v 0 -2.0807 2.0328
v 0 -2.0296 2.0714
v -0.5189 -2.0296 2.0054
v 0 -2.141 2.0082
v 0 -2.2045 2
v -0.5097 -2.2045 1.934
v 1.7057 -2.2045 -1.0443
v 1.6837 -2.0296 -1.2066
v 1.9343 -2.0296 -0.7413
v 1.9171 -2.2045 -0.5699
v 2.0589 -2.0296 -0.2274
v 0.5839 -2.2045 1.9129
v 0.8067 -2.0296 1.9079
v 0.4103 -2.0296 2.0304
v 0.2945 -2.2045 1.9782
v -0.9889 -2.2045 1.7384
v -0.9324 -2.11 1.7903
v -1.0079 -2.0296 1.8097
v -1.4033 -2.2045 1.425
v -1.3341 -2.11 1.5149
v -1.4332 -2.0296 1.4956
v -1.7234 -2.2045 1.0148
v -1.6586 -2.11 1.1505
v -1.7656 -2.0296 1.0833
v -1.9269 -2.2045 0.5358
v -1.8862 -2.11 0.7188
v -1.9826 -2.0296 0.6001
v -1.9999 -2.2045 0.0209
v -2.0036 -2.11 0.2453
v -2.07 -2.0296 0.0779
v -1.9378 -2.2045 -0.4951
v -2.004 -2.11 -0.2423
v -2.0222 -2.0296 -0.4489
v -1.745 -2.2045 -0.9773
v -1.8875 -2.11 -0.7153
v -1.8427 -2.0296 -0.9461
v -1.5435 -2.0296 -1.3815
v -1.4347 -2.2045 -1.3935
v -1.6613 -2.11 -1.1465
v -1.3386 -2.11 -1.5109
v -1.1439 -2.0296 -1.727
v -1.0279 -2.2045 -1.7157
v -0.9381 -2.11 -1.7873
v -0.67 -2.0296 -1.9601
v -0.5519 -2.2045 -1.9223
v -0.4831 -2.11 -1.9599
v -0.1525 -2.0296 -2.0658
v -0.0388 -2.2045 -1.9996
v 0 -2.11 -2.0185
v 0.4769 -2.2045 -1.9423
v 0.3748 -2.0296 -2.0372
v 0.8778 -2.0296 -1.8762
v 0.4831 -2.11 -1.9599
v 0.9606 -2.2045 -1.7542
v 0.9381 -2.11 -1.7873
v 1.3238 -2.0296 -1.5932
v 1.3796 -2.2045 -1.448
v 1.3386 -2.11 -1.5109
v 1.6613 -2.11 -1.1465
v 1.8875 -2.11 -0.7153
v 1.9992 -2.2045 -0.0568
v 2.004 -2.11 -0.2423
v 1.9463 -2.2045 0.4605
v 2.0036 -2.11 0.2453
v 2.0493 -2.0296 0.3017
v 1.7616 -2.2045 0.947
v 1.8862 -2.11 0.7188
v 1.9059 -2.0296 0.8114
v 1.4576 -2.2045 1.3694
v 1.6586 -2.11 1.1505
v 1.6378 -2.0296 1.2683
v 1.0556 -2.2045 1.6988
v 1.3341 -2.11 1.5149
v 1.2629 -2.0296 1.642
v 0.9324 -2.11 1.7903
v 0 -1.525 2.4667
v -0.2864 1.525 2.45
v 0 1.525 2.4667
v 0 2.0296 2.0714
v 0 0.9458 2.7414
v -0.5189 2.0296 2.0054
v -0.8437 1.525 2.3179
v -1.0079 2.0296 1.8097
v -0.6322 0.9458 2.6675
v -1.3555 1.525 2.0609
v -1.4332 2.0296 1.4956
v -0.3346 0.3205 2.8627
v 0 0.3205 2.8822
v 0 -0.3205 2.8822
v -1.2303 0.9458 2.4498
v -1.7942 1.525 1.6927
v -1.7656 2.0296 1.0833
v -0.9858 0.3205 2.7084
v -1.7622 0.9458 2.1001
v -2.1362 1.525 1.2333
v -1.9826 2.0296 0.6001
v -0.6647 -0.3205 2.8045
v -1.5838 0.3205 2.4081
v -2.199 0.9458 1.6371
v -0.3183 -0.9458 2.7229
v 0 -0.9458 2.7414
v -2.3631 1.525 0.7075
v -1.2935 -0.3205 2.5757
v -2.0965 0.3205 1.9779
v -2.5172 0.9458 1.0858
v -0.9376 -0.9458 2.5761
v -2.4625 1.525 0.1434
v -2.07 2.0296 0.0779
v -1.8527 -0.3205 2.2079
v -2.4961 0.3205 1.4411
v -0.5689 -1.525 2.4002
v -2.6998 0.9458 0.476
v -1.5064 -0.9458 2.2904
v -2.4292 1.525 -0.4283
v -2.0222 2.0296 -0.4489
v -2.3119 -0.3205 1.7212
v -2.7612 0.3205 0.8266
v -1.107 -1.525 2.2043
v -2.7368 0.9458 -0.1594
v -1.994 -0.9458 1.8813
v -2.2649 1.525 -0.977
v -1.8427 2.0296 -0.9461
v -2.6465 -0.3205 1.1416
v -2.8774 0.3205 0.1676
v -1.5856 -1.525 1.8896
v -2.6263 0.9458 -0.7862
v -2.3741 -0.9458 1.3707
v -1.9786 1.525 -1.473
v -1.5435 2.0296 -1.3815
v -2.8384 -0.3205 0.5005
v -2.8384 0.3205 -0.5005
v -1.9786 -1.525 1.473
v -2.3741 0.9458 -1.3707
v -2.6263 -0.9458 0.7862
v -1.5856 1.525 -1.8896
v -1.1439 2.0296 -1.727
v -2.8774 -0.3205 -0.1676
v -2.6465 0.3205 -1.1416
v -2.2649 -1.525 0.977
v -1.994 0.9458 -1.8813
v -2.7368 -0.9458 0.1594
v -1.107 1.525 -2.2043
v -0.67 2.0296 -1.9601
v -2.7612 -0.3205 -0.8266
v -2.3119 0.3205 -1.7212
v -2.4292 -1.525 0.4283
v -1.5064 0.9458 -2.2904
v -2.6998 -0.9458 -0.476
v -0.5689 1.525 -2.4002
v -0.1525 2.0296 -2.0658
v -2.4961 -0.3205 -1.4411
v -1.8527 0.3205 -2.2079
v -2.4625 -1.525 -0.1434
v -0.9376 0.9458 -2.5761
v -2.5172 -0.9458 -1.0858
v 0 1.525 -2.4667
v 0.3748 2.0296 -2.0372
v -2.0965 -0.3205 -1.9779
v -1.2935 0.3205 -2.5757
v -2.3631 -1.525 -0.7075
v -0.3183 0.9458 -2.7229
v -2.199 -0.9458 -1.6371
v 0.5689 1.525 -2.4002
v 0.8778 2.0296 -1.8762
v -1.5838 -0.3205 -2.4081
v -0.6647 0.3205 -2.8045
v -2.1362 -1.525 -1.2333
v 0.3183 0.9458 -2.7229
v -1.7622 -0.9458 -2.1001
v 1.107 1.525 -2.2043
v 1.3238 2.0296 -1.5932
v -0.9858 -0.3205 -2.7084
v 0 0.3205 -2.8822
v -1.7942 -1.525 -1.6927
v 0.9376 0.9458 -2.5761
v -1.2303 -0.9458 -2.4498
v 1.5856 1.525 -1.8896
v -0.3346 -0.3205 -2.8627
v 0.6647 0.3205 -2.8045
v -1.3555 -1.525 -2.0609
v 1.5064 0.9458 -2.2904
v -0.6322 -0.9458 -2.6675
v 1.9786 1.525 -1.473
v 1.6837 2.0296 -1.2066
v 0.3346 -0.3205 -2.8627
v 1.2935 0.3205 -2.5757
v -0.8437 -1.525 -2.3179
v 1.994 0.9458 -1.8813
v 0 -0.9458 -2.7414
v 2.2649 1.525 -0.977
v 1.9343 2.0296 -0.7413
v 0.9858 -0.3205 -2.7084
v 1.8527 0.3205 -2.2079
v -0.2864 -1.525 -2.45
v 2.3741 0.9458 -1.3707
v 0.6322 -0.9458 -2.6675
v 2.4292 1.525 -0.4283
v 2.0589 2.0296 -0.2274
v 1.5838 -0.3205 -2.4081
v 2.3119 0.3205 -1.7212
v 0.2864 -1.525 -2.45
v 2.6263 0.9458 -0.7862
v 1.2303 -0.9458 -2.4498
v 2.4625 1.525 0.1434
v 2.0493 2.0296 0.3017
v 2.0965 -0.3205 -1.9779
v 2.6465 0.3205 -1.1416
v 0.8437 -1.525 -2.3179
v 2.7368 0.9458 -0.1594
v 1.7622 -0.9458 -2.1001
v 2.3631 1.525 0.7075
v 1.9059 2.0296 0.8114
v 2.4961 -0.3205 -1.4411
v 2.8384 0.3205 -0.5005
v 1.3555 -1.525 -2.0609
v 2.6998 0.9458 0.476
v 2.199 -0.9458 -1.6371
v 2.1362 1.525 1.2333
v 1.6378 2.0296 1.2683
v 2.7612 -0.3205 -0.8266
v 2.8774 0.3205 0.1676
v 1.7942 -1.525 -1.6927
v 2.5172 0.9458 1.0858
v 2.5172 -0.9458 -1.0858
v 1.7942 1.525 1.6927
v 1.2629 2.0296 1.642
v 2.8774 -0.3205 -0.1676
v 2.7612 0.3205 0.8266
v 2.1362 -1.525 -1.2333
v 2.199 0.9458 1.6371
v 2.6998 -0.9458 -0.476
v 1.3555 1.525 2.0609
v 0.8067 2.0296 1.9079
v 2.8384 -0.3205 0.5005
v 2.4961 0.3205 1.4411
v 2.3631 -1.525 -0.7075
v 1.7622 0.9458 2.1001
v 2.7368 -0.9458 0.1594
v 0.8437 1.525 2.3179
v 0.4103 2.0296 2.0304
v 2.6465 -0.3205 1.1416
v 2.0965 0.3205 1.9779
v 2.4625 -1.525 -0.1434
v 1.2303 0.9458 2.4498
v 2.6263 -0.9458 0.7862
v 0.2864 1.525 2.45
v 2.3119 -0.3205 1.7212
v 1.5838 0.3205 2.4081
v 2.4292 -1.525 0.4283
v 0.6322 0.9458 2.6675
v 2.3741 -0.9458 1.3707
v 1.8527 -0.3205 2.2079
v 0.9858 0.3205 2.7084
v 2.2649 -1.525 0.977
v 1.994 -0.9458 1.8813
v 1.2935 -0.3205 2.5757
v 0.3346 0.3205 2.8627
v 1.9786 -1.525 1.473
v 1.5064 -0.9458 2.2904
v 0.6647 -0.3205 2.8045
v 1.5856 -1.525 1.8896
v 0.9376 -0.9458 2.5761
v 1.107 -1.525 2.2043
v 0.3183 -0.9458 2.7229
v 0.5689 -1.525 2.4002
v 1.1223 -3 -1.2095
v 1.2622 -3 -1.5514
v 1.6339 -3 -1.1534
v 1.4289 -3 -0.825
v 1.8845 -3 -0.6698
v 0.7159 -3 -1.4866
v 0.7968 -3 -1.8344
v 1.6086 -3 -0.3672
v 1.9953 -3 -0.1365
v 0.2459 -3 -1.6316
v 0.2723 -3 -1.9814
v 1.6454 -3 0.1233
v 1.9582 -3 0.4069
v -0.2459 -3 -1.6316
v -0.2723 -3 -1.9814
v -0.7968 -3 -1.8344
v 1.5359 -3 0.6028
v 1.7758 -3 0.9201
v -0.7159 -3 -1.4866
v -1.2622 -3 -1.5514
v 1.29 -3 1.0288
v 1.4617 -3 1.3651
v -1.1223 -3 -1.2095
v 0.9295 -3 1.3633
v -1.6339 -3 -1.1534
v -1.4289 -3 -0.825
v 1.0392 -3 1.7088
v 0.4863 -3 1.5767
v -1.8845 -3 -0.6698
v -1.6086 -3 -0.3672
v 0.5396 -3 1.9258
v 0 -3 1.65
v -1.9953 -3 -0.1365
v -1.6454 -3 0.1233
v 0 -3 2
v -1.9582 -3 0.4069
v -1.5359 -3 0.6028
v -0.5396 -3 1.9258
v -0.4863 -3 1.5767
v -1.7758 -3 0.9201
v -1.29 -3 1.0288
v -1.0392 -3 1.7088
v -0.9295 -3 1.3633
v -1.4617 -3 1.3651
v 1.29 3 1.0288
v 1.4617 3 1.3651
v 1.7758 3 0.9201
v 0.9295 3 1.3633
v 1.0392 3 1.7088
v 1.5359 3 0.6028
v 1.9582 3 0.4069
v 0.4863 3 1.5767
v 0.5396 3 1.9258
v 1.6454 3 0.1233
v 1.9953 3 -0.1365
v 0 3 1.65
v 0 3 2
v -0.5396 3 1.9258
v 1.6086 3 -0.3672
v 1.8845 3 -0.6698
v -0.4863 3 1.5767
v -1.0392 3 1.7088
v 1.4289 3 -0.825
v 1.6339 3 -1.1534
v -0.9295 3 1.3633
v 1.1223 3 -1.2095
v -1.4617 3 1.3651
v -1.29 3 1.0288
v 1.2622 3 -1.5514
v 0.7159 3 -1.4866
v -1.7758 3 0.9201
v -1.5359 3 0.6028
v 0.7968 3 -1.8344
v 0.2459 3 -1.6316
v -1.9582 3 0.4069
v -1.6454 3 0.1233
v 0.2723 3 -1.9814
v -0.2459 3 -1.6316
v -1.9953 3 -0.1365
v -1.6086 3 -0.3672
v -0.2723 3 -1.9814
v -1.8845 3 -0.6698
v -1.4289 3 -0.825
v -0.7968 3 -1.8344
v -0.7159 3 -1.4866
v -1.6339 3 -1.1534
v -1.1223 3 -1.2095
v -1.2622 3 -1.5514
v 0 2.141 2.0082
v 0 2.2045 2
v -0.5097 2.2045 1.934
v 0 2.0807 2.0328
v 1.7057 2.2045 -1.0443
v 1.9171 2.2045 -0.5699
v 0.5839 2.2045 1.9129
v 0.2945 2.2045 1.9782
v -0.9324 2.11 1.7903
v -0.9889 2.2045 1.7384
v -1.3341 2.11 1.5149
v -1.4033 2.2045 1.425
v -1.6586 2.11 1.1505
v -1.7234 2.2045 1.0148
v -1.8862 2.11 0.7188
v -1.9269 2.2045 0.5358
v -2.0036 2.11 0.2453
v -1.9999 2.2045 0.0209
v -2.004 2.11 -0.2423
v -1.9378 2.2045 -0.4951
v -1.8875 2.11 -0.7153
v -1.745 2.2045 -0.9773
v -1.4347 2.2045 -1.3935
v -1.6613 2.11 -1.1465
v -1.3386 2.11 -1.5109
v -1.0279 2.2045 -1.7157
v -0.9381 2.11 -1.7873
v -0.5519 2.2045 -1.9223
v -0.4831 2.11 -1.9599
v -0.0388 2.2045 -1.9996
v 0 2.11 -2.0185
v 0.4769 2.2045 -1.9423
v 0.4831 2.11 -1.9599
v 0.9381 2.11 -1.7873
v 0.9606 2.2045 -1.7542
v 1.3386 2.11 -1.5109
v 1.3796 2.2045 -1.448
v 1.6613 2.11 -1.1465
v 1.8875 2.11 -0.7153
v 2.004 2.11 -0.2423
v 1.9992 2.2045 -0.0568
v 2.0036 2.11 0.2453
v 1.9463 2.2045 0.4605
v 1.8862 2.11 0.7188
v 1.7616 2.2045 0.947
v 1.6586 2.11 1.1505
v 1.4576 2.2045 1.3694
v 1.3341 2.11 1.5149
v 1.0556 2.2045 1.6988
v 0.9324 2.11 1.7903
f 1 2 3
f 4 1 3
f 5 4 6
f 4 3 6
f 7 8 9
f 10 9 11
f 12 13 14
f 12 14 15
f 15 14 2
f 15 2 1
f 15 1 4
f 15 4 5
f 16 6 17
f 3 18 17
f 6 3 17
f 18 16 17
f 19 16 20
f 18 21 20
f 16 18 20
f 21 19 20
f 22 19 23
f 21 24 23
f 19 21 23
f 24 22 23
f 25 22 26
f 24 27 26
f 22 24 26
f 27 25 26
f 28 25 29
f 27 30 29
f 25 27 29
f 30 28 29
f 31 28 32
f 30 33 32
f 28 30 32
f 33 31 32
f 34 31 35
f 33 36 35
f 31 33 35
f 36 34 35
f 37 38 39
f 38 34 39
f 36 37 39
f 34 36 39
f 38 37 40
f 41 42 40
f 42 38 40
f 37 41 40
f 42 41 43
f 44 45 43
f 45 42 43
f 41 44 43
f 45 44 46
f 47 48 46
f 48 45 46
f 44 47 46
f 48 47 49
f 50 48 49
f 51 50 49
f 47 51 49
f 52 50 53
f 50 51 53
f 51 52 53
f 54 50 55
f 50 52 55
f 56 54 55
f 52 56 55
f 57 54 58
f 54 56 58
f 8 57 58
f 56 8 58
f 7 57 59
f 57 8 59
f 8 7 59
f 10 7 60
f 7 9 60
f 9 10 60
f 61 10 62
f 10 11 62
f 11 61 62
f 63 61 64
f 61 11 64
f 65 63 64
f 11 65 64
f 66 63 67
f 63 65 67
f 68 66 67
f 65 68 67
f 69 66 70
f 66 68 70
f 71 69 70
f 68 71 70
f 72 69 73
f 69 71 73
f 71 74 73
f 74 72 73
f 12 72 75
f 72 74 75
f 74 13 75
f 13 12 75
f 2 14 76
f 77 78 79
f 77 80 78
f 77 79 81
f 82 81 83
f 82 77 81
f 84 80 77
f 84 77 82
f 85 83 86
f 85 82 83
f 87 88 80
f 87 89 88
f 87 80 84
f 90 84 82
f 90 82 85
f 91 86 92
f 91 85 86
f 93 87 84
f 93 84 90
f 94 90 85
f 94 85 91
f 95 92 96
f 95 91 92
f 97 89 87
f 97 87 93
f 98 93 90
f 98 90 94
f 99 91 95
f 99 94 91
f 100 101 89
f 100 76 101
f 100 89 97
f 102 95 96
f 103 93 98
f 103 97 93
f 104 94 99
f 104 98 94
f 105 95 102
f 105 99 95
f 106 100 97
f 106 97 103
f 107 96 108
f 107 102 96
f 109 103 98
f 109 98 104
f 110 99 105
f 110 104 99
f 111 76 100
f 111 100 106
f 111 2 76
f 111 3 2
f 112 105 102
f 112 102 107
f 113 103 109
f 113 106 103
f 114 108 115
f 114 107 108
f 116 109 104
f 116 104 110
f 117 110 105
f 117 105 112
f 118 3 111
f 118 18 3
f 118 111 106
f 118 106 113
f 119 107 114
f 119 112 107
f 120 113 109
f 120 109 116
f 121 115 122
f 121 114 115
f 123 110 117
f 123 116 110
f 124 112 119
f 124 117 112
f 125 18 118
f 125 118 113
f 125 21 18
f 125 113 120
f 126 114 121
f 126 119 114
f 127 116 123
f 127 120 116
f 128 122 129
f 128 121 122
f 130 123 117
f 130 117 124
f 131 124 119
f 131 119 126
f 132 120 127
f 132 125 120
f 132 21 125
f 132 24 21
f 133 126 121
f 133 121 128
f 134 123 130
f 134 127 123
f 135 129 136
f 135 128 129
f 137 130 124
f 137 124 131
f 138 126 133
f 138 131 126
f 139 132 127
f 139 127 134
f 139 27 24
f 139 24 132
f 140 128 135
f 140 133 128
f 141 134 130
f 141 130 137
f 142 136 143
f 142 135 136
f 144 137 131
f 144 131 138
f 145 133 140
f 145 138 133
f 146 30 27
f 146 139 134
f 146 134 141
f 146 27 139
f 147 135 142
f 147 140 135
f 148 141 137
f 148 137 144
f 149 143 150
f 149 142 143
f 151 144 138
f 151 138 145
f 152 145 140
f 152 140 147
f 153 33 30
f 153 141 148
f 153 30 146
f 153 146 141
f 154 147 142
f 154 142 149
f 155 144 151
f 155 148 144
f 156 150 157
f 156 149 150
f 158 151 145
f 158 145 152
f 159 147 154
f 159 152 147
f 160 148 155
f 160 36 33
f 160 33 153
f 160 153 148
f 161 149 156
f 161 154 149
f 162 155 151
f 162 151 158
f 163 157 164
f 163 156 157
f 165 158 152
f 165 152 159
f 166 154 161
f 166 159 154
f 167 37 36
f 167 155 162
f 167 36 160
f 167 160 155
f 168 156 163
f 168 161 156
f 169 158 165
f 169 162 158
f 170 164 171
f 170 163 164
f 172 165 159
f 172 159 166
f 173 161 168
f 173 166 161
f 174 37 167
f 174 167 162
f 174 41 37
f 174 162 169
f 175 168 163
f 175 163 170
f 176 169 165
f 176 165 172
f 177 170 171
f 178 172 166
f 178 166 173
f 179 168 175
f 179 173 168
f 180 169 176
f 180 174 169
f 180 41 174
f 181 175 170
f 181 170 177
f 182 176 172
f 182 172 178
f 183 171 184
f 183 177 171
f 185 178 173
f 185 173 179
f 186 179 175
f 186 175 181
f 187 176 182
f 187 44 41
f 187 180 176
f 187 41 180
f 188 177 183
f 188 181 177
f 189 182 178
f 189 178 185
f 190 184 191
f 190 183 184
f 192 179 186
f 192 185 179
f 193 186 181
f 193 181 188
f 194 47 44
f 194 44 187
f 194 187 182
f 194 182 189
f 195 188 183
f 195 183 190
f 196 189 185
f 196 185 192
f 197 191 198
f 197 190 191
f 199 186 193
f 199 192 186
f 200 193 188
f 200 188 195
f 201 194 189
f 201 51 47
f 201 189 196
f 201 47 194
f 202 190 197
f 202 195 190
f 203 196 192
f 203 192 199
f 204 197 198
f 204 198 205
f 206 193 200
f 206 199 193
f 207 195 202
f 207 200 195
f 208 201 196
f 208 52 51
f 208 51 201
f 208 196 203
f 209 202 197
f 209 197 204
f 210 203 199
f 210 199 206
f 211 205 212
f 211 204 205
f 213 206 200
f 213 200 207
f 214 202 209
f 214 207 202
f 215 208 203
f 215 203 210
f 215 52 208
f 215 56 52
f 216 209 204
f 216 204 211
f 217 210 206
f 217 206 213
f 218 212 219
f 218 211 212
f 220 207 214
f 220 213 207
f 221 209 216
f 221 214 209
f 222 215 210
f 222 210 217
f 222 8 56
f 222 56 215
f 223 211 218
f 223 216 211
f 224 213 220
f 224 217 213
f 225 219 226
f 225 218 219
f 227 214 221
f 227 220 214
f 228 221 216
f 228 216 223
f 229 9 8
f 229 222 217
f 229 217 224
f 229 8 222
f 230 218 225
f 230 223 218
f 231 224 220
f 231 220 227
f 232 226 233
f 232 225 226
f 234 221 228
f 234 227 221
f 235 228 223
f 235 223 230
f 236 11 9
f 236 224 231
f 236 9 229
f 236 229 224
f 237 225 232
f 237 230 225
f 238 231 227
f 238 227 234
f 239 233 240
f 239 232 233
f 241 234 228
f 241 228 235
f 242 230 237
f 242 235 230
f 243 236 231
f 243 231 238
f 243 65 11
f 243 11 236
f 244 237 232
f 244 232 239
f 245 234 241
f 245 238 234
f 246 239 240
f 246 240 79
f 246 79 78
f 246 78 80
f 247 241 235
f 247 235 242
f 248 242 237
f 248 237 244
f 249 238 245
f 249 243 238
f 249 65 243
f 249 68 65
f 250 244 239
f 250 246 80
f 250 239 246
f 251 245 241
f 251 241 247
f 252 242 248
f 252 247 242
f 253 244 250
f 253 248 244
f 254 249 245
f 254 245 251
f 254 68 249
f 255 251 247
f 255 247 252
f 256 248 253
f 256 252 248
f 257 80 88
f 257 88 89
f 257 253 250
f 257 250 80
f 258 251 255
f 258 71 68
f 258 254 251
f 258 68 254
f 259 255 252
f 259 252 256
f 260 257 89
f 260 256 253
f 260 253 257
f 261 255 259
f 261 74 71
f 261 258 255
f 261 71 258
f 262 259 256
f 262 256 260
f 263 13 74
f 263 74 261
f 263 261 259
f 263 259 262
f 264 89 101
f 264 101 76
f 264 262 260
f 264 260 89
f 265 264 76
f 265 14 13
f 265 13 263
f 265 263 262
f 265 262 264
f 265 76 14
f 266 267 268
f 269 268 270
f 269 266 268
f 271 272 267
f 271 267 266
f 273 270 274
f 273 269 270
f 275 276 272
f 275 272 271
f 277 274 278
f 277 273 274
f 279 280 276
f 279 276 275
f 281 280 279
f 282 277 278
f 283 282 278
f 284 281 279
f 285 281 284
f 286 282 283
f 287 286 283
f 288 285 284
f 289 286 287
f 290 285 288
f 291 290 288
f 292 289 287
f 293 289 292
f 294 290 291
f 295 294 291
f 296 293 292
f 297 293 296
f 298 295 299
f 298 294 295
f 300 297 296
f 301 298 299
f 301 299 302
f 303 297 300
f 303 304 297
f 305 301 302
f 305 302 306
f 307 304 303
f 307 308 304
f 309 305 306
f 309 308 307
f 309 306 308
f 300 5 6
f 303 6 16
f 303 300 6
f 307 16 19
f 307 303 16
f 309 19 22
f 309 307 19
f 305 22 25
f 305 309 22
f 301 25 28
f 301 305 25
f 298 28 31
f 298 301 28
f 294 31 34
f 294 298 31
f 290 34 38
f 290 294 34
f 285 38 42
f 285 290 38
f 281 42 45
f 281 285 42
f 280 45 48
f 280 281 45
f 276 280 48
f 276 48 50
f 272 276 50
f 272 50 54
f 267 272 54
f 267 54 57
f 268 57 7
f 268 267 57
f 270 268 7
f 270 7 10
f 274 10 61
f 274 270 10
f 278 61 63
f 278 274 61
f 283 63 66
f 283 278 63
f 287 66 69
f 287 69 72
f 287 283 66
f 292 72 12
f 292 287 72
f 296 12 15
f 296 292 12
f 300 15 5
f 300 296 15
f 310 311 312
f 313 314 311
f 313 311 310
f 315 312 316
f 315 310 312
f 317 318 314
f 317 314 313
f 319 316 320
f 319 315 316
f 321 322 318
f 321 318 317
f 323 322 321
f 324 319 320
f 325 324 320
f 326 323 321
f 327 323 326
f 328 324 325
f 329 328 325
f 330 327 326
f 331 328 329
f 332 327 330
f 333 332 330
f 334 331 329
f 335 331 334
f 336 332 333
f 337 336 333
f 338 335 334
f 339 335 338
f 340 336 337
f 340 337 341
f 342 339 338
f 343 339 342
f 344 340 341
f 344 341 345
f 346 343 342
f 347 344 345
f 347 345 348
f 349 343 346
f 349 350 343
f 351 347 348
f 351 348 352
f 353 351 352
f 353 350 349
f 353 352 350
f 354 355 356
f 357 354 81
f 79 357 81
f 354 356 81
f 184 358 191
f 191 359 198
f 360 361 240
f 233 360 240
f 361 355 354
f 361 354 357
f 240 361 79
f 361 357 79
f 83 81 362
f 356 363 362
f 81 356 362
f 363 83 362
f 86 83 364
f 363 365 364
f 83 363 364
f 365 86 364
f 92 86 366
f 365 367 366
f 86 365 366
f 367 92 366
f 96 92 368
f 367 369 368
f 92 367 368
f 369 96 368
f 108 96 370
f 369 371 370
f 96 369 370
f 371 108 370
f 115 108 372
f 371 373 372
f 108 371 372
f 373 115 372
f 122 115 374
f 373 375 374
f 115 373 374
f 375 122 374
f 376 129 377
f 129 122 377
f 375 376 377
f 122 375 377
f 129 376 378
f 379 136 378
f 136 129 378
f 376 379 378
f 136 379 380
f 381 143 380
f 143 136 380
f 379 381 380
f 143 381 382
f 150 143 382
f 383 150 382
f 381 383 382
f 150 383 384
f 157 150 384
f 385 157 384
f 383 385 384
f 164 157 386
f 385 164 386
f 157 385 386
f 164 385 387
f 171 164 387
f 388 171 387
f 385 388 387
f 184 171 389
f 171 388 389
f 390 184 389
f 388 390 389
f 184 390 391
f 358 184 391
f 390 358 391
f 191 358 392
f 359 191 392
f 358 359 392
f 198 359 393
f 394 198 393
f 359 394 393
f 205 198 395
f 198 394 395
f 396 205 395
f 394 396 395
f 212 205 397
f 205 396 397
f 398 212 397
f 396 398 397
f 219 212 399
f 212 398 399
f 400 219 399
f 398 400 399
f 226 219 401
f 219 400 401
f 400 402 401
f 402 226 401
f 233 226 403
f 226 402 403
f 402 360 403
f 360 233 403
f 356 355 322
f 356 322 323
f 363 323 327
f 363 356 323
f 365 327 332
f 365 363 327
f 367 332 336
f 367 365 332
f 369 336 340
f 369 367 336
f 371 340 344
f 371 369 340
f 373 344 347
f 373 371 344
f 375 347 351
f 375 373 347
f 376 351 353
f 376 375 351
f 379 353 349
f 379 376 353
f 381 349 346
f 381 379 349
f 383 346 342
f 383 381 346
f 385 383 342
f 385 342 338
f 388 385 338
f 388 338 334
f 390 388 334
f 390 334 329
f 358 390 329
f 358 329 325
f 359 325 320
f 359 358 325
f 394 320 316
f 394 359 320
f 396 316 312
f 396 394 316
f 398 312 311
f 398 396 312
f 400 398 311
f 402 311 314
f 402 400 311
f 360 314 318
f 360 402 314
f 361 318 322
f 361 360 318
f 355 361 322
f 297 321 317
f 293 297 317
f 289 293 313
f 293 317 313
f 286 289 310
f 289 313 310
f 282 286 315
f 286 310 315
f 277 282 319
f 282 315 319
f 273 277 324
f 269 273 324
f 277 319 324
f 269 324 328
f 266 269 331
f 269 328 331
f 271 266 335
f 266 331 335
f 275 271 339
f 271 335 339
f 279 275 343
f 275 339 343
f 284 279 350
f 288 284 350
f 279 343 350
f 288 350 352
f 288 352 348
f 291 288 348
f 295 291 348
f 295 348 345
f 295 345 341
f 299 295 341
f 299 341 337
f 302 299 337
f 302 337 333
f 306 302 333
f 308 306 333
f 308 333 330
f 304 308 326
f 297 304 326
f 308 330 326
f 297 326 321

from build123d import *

# Parameters (mm, degrees)
SKETCH2_R          = 1.65
CUT_EXTRUDE1_DEPTH = 6
FILLET1_R          = 0.25


with BuildPart() as part:
    # Sketch1 → Revolve1 (revolve)
    with BuildSketch(Plane.XY, mode=Mode.PRIVATE) as revolve1_sk:
        with BuildLine():
            Line((0, 3), (2, 3))
            Line((2, 3), (2, 2.1))
            ThreePointArc((2, 2.1), (2.9, 0), (2, -2.1))
            Line((2, -2.1), (2, -3))
            Line((2, -3), (0, -3))
            Line((0, -3), (0, 3))
        make_face()
    revolve(revolve1_sk.sketch.rotate(Axis((0, 4.183554313, 0), (0, -1, 0)), 90), axis=Axis((0, 4.183554313, 0), (0, -1, 0)))

    # Sketch2 → Cut-Extrude1 (cut)
    with BuildSketch(Plane(origin=(0, 3, 0), x_dir=(1, 0, 0), z_dir=(0, 1, 0))):
        with Locations(Location((0, 0, 0), (0, 0, 270))):
            Circle(SKETCH2_R)
    extrude(amount=-CUT_EXTRUDE1_DEPTH, mode=Mode.SUBTRACT)

    # Fillet1
    fillet1_edges = [part.edges().sort_by_distance(p)[0] for p in [
        (0, -2.1, -2),
        (0, 2.1, -2),
    ]]
    fillet(fillet1_edges, radius=FILLET1_R)


solid = part.part
